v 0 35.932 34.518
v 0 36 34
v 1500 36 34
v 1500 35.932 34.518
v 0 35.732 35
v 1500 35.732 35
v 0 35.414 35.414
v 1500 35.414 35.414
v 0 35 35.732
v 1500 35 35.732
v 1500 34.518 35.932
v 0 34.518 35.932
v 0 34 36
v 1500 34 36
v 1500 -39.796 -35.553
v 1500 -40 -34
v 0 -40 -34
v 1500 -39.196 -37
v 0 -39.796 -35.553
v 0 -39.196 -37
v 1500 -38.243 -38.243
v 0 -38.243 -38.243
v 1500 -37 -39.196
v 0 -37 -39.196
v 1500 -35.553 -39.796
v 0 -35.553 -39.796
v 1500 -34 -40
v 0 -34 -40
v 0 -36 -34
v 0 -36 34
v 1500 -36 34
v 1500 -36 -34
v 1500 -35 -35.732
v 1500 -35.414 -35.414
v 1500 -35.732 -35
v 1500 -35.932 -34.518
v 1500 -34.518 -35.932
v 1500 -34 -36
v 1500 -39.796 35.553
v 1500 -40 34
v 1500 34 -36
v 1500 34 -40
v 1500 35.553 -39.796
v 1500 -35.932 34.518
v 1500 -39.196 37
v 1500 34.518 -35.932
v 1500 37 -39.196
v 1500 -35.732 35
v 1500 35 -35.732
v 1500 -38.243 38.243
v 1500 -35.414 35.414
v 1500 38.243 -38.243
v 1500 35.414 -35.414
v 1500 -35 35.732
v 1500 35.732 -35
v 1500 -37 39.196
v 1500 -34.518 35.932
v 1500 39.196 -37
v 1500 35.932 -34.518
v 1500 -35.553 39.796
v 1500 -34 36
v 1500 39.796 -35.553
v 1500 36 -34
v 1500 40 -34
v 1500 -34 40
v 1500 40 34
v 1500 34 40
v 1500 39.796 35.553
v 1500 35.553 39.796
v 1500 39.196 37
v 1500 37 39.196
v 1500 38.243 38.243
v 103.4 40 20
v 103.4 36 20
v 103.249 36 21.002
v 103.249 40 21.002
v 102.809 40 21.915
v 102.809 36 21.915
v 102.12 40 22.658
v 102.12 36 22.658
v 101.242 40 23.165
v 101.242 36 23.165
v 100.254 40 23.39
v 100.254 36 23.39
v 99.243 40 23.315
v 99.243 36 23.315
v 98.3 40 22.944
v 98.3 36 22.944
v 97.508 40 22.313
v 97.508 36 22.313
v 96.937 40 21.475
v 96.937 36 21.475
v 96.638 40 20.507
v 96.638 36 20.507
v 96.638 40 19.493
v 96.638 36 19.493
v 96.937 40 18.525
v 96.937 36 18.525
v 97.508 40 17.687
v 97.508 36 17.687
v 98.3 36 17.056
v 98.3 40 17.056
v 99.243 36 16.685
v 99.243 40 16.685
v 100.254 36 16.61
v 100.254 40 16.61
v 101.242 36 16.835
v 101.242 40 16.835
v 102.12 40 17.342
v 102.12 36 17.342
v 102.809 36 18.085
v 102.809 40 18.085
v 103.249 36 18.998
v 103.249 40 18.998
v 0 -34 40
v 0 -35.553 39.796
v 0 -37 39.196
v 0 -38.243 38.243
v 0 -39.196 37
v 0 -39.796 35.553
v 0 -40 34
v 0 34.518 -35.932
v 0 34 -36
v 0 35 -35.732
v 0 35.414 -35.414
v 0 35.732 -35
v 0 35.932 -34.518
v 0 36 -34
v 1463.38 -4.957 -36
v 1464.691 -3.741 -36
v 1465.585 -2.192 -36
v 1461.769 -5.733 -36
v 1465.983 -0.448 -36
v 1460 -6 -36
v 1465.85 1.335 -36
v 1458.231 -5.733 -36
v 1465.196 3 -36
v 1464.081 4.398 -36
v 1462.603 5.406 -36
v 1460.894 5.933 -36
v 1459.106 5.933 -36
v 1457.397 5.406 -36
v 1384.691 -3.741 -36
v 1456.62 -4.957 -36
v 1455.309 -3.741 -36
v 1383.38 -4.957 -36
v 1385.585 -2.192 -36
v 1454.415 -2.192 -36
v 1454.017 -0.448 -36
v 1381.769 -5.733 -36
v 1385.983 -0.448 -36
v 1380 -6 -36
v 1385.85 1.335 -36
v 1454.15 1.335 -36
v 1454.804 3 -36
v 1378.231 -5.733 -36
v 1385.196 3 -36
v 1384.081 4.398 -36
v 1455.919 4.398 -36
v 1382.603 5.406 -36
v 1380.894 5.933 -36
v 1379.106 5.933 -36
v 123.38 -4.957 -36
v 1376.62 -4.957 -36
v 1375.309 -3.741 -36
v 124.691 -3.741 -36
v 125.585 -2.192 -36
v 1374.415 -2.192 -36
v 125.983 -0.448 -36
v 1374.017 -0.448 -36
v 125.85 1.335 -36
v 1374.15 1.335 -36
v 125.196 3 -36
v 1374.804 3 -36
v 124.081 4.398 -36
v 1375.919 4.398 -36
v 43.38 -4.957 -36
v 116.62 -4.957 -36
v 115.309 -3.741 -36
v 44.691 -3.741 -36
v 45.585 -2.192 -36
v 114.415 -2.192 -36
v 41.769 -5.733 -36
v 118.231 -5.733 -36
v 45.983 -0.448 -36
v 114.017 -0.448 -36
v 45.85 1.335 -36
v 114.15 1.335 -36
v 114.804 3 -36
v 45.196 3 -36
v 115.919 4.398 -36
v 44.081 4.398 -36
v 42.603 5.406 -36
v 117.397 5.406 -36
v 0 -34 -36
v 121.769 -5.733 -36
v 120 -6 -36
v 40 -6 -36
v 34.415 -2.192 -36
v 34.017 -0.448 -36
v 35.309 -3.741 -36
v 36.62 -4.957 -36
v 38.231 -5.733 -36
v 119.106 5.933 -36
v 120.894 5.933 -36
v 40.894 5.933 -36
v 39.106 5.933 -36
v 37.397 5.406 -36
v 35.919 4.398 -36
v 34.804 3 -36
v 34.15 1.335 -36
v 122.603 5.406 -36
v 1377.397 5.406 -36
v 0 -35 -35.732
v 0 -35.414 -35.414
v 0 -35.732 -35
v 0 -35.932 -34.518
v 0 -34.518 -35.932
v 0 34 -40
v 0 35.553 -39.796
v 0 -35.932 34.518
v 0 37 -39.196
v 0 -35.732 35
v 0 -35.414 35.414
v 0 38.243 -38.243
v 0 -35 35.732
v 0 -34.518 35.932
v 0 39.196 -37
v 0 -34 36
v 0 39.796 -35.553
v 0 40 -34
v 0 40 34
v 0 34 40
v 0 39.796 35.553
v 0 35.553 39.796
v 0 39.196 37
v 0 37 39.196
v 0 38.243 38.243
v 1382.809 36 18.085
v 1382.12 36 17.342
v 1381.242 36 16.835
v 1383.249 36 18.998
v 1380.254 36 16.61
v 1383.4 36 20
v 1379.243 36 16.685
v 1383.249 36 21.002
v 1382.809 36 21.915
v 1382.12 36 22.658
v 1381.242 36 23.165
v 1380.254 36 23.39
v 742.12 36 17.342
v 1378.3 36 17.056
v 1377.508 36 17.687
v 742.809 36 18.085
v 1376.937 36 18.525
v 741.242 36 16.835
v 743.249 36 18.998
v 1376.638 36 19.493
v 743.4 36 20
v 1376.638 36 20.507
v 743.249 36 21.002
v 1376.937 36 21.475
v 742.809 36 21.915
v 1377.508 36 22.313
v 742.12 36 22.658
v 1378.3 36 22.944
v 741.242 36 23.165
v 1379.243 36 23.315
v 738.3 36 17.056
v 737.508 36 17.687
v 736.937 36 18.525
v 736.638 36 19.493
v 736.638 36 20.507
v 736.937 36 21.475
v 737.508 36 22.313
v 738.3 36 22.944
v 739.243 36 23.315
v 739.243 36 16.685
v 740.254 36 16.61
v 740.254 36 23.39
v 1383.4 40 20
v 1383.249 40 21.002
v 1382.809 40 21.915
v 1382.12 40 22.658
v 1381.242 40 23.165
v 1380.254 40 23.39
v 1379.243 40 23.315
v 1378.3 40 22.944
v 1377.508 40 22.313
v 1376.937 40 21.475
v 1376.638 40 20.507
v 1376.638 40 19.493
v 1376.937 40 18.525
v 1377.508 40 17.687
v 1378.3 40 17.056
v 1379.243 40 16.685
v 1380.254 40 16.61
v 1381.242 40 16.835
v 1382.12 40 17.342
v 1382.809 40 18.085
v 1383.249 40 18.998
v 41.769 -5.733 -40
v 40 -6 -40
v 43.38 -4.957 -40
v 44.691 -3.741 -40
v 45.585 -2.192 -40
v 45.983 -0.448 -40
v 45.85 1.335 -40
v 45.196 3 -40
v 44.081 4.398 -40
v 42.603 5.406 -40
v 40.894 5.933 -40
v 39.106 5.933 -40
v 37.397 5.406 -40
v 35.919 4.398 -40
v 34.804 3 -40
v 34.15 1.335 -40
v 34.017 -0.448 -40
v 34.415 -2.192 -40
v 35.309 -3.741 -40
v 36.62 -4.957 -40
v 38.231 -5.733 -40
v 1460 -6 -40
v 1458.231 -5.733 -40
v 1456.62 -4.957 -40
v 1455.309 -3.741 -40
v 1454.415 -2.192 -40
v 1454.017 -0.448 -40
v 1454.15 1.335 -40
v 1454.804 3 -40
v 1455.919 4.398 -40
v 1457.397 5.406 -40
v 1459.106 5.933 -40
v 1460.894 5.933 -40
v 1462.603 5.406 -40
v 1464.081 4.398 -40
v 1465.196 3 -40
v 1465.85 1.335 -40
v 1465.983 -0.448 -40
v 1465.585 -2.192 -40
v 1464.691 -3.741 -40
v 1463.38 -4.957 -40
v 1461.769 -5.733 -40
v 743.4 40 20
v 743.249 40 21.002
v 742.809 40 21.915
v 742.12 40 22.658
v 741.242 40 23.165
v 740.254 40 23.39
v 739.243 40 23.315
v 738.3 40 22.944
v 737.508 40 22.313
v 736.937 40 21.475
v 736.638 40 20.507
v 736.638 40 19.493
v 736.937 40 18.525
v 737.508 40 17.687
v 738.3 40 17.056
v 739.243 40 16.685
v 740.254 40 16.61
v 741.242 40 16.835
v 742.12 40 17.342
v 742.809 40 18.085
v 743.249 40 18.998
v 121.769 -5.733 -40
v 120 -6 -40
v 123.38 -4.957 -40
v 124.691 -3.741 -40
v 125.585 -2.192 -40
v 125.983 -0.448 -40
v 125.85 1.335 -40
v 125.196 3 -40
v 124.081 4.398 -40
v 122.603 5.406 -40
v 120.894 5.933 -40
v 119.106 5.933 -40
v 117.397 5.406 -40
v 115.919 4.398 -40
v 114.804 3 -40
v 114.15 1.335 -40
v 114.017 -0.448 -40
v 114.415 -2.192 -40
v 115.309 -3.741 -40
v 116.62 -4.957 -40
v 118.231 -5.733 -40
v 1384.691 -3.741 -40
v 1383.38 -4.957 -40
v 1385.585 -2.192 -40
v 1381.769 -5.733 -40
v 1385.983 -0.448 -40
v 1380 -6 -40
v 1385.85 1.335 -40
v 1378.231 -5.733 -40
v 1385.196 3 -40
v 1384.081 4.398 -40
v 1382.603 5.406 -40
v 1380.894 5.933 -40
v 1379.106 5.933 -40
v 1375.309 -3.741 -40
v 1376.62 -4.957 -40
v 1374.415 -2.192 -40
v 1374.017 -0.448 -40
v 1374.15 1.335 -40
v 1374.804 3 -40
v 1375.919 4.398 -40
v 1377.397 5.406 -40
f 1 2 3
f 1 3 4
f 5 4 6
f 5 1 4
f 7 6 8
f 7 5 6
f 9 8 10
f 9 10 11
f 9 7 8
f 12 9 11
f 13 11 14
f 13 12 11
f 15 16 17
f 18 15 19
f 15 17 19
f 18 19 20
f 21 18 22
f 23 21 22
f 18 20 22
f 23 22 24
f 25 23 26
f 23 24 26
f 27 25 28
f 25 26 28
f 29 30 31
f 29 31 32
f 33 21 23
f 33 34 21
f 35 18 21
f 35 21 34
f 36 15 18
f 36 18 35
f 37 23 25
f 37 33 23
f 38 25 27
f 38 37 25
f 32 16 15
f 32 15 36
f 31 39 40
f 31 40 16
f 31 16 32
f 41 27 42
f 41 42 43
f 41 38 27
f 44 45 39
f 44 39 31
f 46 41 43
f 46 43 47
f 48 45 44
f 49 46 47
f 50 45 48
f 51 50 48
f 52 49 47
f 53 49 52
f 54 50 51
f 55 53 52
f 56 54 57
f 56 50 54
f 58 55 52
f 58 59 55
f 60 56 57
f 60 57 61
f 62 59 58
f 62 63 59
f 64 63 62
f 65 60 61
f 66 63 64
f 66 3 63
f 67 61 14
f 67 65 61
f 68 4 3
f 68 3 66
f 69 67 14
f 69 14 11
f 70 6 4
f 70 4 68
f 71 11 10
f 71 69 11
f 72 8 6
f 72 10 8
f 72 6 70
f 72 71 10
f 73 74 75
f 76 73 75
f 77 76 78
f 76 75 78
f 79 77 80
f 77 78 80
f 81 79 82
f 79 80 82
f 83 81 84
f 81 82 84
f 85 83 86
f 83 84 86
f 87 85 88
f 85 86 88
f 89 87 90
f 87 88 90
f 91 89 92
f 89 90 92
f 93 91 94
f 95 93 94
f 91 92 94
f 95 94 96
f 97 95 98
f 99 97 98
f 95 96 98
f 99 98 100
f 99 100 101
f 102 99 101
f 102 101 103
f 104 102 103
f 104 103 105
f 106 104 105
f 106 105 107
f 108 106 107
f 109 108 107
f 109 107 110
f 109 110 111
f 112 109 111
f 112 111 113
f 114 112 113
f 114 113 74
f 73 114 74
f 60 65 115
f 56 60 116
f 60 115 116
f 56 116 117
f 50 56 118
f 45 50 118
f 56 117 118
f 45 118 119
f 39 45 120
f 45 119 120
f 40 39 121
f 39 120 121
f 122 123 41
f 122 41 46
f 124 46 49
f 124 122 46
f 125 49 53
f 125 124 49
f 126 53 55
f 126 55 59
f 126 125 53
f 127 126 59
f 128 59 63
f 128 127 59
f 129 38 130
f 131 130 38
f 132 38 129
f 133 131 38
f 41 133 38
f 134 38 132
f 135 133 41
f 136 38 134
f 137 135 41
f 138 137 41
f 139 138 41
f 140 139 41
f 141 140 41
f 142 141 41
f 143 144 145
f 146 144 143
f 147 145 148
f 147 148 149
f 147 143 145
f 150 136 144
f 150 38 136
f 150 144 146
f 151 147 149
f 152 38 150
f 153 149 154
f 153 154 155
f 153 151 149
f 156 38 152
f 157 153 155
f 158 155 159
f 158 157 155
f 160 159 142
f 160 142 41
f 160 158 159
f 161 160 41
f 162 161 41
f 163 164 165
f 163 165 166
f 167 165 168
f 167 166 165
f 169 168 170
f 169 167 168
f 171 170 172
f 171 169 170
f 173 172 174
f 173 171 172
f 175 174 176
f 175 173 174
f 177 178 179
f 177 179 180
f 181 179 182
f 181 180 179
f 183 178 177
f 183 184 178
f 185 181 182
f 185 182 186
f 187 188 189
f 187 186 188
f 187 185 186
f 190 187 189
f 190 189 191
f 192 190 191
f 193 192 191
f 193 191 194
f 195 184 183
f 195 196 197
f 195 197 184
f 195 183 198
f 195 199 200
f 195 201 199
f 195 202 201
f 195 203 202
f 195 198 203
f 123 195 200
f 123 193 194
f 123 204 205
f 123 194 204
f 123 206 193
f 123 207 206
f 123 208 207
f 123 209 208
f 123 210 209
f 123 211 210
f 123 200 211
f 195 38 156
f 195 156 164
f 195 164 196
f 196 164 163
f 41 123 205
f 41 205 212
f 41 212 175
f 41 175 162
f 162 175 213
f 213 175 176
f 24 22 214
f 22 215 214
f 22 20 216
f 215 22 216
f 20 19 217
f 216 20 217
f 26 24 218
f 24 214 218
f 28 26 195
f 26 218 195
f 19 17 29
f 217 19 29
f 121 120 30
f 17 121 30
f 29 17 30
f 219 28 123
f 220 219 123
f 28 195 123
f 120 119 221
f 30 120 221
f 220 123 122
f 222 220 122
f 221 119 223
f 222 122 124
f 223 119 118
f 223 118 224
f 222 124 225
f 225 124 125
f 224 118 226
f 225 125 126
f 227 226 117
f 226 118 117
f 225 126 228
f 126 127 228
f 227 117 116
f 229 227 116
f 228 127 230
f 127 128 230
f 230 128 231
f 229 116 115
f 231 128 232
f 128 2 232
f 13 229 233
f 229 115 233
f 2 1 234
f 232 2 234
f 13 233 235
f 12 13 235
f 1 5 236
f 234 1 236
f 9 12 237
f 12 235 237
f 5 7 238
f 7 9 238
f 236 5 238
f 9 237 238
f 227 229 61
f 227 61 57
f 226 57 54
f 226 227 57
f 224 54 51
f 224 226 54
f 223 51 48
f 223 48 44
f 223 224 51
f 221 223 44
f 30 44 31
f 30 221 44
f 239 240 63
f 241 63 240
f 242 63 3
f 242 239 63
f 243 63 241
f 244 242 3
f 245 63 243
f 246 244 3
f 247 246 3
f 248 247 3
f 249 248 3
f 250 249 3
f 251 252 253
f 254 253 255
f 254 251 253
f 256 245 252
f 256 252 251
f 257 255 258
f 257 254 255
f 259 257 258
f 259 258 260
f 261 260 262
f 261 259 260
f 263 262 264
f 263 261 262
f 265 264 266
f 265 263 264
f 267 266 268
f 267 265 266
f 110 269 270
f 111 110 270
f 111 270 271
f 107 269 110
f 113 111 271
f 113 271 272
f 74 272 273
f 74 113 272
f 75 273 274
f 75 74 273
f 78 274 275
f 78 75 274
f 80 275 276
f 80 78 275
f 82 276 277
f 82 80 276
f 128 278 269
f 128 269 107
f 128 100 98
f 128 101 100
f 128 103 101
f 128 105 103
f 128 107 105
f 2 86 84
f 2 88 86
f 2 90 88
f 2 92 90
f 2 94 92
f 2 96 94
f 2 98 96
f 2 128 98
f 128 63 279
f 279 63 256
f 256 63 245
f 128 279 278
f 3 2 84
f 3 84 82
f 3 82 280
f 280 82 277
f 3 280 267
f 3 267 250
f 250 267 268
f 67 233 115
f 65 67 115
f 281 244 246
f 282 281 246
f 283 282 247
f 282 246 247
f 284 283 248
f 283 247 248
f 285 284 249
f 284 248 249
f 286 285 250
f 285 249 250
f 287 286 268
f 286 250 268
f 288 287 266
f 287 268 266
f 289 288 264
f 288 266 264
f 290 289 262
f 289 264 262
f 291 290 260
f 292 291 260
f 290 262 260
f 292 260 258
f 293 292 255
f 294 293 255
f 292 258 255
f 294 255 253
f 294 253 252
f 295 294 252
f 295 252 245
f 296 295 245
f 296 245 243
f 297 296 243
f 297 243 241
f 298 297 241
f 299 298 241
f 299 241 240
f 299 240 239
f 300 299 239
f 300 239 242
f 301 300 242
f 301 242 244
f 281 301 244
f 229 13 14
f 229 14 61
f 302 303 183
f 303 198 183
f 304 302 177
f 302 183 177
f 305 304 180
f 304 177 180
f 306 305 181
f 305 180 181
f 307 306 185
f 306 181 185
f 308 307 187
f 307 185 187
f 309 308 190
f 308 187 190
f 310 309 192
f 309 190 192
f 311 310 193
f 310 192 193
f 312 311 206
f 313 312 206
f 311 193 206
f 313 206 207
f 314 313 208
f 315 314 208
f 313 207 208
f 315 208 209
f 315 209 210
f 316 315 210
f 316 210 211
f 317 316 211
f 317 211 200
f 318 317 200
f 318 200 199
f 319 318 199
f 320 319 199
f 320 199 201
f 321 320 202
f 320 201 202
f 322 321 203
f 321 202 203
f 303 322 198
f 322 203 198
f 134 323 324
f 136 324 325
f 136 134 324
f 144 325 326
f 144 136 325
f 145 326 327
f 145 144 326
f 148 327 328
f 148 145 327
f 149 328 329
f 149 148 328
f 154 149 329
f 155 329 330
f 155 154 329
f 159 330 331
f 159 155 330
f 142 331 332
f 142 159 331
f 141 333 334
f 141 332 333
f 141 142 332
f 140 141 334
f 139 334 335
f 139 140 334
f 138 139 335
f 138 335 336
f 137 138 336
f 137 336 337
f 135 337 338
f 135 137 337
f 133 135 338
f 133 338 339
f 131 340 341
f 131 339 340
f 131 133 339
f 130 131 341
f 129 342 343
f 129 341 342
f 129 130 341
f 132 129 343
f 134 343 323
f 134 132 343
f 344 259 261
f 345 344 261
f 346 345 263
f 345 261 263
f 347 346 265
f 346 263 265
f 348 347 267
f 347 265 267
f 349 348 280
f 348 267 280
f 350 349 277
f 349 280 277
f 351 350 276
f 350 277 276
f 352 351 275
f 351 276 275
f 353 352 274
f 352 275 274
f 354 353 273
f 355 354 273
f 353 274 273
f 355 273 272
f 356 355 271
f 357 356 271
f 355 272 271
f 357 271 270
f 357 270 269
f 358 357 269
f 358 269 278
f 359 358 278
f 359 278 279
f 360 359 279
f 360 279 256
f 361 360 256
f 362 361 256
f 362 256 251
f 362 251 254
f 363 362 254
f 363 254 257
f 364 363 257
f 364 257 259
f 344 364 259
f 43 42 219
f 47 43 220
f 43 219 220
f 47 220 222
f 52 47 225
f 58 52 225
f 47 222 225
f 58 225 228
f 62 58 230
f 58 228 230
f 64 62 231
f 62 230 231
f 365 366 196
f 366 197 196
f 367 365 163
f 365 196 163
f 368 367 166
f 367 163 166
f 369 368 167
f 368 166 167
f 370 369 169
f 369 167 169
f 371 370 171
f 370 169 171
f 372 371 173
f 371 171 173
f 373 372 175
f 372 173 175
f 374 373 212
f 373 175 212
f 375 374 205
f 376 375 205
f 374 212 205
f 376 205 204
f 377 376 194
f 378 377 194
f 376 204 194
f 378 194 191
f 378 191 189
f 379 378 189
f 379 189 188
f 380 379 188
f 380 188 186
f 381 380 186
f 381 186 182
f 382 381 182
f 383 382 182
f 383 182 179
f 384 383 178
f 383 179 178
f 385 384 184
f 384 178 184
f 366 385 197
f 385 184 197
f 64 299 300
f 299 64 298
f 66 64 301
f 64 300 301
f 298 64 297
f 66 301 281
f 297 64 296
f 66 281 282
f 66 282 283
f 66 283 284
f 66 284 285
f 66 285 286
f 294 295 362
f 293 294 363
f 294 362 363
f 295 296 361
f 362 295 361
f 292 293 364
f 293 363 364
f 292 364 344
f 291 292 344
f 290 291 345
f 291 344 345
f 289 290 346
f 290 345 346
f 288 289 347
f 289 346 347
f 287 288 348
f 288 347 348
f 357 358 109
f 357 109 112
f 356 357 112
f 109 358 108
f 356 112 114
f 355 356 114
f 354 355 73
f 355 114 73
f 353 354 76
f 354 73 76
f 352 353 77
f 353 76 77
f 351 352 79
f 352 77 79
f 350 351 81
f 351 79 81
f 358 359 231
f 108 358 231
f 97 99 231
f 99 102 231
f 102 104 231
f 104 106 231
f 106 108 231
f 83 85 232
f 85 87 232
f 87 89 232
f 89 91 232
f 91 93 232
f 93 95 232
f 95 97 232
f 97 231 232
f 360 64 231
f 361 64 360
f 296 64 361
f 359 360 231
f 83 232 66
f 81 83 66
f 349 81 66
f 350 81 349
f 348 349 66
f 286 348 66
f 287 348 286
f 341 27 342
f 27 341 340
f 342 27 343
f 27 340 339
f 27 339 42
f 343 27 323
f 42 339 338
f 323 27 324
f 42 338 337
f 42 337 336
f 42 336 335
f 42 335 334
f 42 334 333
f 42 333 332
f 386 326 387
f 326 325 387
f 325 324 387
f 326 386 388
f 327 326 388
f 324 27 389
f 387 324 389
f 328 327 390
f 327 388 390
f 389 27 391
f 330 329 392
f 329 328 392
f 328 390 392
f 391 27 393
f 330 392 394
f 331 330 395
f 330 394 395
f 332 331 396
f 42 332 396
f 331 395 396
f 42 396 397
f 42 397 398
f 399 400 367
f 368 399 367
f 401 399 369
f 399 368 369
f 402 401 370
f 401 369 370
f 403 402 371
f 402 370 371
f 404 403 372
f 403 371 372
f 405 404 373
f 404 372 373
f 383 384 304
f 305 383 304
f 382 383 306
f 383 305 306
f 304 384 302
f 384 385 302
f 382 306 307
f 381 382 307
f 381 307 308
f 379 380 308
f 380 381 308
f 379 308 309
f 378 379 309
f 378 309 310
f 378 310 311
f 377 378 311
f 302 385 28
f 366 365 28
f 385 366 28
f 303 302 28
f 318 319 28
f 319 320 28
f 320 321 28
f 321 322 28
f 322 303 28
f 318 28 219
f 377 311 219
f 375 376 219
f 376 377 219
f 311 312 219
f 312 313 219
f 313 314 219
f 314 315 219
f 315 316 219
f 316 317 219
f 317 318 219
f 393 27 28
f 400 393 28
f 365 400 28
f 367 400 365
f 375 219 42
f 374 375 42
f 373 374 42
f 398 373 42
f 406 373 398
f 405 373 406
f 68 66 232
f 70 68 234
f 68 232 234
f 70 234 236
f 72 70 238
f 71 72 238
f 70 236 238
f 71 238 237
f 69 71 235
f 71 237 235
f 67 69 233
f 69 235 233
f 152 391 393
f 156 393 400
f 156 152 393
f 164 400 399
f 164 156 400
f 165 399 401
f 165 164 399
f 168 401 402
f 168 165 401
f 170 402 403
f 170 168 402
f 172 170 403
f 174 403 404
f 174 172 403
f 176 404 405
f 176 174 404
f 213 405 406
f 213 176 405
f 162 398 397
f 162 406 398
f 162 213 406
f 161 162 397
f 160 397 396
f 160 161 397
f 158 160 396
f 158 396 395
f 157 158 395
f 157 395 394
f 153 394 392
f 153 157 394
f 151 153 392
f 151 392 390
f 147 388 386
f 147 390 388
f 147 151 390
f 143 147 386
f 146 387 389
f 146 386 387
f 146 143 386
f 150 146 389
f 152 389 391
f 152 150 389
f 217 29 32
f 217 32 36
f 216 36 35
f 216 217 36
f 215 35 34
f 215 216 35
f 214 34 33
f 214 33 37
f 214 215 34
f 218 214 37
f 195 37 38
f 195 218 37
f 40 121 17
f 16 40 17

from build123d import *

# Parameters (mm, degrees)
MEMBER_1_DEPTH               = 1500
HOLE_WIZARD_M10_1_AT_2_COUNT = 2
HOLE_WIZARD_M10_1_AT_2_PITCH = 80
HOLE_WIZARD_M8_2_D           = 6.8
HOLE_WIZARD_M8_2_DEPTH       = 22.25
HOLE_WIZARD_M8_2_TIP         = 2.042926105


with BuildPart() as part:
    # Sketch11 → Member 1 (new body)
    with BuildSketch(Plane.YZ):
        with BuildLine():
            Line((-34, -40), (34, -40))
            ThreePointArc((34, -40), (38.242640687, -38.242640687), (40, -34))
            Line((40, -34), (40, 34))
            ThreePointArc((40, 34), (38.242640687, 38.242640687), (34, 40))
            Line((34, 40), (-34, 40))
            ThreePointArc((-34, 40), (-38.242640687, 38.242640687), (-40, 34))
            Line((-40, 34), (-40, -34))
            ThreePointArc((-40, -34), (-38.242640687, -38.242640687), (-34, -40))
        make_face()
        with BuildLine():
            Line((-34, -36), (34, -36))
            ThreePointArc((34, -36), (35.414213562, -35.414213562), (36, -34))
            Line((36, -34), (36, 34))
            ThreePointArc((36, 34), (35.414213562, 35.414213562), (34, 36))
            Line((34, 36), (-34, 36))
            ThreePointArc((-34, 36), (-35.414213562, 35.414213562), (-36, 34))
            Line((-36, 34), (-36, -34))
            ThreePointArc((-36, -34), (-35.414213562, -35.414213562), (-34, -36))
        make_face(mode=Mode.SUBTRACT)
    extrude(amount=MEMBER_1_DEPTH)

    # 草图4 → M10 间隙孔1 (revolve, cut)
    with BuildSketch(Plane(origin=(1380, 0, -36), x_dir=(0, -1, 0), z_dir=(1, 0, 0))):
        Polygon((0, 0), (0, 33.605163714), (6, 30), (6, 0), align=None)
    hole_wizard_m10_1 = revolve(axis=Axis((1380, 0, -29.65), (0, 0, -1)), mode=Mode.SUBTRACT)

    # M10 间隙孔1 at 2: M10 间隙孔1 ×2
    with Locations(*[(i * HOLE_WIZARD_M10_1_AT_2_PITCH, 0, 0) for i in range(1, HOLE_WIZARD_M10_1_AT_2_COUNT)]):
        add(hole_wizard_m10_1, mode=Mode.SUBTRACT)

    # 镜向1: M10 间隙孔1 across plane
    add(hole_wizard_m10_1.mirror(Plane.ZY.offset(-750)), mode=Mode.SUBTRACT)

    # 镜向1 copy 1 sketch → 镜向1 copy 1 (revolve, cut)
    with BuildSketch(Plane(origin=(40, 0, -36), x_dir=(0, -1, 0), z_dir=(-1, 0, 0))):
        Polygon((0, 0), (0, -33.605163714), (6, -30), (6, 0), align=None)
    revolve(axis=Axis((40, 0, -29.65), (0, 0, 1)), mode=Mode.SUBTRACT)

    # M8 螺纹孔2
    with Locations(Plane(origin=(0, 40, 0), x_dir=(-1, 0, 0), z_dir=(0, 1, 0))):
        with Locations((-100.000000009, 20), (-740.000000009, 20), (-1380.000000009, 20), (-1580.000000007, 20), (-2220.000000007, 20), (-2860.000000007, 20)):
            Hole(HOLE_WIZARD_M8_2_D / 2, depth=HOLE_WIZARD_M8_2_DEPTH)
            with Locations((0, 0, -(HOLE_WIZARD_M8_2_DEPTH + HOLE_WIZARD_M8_2_TIP / 2))):  # 118° drill point
                Cone(0, HOLE_WIZARD_M8_2_D / 2, HOLE_WIZARD_M8_2_TIP, mode=Mode.SUBTRACT)


solid = part.part
